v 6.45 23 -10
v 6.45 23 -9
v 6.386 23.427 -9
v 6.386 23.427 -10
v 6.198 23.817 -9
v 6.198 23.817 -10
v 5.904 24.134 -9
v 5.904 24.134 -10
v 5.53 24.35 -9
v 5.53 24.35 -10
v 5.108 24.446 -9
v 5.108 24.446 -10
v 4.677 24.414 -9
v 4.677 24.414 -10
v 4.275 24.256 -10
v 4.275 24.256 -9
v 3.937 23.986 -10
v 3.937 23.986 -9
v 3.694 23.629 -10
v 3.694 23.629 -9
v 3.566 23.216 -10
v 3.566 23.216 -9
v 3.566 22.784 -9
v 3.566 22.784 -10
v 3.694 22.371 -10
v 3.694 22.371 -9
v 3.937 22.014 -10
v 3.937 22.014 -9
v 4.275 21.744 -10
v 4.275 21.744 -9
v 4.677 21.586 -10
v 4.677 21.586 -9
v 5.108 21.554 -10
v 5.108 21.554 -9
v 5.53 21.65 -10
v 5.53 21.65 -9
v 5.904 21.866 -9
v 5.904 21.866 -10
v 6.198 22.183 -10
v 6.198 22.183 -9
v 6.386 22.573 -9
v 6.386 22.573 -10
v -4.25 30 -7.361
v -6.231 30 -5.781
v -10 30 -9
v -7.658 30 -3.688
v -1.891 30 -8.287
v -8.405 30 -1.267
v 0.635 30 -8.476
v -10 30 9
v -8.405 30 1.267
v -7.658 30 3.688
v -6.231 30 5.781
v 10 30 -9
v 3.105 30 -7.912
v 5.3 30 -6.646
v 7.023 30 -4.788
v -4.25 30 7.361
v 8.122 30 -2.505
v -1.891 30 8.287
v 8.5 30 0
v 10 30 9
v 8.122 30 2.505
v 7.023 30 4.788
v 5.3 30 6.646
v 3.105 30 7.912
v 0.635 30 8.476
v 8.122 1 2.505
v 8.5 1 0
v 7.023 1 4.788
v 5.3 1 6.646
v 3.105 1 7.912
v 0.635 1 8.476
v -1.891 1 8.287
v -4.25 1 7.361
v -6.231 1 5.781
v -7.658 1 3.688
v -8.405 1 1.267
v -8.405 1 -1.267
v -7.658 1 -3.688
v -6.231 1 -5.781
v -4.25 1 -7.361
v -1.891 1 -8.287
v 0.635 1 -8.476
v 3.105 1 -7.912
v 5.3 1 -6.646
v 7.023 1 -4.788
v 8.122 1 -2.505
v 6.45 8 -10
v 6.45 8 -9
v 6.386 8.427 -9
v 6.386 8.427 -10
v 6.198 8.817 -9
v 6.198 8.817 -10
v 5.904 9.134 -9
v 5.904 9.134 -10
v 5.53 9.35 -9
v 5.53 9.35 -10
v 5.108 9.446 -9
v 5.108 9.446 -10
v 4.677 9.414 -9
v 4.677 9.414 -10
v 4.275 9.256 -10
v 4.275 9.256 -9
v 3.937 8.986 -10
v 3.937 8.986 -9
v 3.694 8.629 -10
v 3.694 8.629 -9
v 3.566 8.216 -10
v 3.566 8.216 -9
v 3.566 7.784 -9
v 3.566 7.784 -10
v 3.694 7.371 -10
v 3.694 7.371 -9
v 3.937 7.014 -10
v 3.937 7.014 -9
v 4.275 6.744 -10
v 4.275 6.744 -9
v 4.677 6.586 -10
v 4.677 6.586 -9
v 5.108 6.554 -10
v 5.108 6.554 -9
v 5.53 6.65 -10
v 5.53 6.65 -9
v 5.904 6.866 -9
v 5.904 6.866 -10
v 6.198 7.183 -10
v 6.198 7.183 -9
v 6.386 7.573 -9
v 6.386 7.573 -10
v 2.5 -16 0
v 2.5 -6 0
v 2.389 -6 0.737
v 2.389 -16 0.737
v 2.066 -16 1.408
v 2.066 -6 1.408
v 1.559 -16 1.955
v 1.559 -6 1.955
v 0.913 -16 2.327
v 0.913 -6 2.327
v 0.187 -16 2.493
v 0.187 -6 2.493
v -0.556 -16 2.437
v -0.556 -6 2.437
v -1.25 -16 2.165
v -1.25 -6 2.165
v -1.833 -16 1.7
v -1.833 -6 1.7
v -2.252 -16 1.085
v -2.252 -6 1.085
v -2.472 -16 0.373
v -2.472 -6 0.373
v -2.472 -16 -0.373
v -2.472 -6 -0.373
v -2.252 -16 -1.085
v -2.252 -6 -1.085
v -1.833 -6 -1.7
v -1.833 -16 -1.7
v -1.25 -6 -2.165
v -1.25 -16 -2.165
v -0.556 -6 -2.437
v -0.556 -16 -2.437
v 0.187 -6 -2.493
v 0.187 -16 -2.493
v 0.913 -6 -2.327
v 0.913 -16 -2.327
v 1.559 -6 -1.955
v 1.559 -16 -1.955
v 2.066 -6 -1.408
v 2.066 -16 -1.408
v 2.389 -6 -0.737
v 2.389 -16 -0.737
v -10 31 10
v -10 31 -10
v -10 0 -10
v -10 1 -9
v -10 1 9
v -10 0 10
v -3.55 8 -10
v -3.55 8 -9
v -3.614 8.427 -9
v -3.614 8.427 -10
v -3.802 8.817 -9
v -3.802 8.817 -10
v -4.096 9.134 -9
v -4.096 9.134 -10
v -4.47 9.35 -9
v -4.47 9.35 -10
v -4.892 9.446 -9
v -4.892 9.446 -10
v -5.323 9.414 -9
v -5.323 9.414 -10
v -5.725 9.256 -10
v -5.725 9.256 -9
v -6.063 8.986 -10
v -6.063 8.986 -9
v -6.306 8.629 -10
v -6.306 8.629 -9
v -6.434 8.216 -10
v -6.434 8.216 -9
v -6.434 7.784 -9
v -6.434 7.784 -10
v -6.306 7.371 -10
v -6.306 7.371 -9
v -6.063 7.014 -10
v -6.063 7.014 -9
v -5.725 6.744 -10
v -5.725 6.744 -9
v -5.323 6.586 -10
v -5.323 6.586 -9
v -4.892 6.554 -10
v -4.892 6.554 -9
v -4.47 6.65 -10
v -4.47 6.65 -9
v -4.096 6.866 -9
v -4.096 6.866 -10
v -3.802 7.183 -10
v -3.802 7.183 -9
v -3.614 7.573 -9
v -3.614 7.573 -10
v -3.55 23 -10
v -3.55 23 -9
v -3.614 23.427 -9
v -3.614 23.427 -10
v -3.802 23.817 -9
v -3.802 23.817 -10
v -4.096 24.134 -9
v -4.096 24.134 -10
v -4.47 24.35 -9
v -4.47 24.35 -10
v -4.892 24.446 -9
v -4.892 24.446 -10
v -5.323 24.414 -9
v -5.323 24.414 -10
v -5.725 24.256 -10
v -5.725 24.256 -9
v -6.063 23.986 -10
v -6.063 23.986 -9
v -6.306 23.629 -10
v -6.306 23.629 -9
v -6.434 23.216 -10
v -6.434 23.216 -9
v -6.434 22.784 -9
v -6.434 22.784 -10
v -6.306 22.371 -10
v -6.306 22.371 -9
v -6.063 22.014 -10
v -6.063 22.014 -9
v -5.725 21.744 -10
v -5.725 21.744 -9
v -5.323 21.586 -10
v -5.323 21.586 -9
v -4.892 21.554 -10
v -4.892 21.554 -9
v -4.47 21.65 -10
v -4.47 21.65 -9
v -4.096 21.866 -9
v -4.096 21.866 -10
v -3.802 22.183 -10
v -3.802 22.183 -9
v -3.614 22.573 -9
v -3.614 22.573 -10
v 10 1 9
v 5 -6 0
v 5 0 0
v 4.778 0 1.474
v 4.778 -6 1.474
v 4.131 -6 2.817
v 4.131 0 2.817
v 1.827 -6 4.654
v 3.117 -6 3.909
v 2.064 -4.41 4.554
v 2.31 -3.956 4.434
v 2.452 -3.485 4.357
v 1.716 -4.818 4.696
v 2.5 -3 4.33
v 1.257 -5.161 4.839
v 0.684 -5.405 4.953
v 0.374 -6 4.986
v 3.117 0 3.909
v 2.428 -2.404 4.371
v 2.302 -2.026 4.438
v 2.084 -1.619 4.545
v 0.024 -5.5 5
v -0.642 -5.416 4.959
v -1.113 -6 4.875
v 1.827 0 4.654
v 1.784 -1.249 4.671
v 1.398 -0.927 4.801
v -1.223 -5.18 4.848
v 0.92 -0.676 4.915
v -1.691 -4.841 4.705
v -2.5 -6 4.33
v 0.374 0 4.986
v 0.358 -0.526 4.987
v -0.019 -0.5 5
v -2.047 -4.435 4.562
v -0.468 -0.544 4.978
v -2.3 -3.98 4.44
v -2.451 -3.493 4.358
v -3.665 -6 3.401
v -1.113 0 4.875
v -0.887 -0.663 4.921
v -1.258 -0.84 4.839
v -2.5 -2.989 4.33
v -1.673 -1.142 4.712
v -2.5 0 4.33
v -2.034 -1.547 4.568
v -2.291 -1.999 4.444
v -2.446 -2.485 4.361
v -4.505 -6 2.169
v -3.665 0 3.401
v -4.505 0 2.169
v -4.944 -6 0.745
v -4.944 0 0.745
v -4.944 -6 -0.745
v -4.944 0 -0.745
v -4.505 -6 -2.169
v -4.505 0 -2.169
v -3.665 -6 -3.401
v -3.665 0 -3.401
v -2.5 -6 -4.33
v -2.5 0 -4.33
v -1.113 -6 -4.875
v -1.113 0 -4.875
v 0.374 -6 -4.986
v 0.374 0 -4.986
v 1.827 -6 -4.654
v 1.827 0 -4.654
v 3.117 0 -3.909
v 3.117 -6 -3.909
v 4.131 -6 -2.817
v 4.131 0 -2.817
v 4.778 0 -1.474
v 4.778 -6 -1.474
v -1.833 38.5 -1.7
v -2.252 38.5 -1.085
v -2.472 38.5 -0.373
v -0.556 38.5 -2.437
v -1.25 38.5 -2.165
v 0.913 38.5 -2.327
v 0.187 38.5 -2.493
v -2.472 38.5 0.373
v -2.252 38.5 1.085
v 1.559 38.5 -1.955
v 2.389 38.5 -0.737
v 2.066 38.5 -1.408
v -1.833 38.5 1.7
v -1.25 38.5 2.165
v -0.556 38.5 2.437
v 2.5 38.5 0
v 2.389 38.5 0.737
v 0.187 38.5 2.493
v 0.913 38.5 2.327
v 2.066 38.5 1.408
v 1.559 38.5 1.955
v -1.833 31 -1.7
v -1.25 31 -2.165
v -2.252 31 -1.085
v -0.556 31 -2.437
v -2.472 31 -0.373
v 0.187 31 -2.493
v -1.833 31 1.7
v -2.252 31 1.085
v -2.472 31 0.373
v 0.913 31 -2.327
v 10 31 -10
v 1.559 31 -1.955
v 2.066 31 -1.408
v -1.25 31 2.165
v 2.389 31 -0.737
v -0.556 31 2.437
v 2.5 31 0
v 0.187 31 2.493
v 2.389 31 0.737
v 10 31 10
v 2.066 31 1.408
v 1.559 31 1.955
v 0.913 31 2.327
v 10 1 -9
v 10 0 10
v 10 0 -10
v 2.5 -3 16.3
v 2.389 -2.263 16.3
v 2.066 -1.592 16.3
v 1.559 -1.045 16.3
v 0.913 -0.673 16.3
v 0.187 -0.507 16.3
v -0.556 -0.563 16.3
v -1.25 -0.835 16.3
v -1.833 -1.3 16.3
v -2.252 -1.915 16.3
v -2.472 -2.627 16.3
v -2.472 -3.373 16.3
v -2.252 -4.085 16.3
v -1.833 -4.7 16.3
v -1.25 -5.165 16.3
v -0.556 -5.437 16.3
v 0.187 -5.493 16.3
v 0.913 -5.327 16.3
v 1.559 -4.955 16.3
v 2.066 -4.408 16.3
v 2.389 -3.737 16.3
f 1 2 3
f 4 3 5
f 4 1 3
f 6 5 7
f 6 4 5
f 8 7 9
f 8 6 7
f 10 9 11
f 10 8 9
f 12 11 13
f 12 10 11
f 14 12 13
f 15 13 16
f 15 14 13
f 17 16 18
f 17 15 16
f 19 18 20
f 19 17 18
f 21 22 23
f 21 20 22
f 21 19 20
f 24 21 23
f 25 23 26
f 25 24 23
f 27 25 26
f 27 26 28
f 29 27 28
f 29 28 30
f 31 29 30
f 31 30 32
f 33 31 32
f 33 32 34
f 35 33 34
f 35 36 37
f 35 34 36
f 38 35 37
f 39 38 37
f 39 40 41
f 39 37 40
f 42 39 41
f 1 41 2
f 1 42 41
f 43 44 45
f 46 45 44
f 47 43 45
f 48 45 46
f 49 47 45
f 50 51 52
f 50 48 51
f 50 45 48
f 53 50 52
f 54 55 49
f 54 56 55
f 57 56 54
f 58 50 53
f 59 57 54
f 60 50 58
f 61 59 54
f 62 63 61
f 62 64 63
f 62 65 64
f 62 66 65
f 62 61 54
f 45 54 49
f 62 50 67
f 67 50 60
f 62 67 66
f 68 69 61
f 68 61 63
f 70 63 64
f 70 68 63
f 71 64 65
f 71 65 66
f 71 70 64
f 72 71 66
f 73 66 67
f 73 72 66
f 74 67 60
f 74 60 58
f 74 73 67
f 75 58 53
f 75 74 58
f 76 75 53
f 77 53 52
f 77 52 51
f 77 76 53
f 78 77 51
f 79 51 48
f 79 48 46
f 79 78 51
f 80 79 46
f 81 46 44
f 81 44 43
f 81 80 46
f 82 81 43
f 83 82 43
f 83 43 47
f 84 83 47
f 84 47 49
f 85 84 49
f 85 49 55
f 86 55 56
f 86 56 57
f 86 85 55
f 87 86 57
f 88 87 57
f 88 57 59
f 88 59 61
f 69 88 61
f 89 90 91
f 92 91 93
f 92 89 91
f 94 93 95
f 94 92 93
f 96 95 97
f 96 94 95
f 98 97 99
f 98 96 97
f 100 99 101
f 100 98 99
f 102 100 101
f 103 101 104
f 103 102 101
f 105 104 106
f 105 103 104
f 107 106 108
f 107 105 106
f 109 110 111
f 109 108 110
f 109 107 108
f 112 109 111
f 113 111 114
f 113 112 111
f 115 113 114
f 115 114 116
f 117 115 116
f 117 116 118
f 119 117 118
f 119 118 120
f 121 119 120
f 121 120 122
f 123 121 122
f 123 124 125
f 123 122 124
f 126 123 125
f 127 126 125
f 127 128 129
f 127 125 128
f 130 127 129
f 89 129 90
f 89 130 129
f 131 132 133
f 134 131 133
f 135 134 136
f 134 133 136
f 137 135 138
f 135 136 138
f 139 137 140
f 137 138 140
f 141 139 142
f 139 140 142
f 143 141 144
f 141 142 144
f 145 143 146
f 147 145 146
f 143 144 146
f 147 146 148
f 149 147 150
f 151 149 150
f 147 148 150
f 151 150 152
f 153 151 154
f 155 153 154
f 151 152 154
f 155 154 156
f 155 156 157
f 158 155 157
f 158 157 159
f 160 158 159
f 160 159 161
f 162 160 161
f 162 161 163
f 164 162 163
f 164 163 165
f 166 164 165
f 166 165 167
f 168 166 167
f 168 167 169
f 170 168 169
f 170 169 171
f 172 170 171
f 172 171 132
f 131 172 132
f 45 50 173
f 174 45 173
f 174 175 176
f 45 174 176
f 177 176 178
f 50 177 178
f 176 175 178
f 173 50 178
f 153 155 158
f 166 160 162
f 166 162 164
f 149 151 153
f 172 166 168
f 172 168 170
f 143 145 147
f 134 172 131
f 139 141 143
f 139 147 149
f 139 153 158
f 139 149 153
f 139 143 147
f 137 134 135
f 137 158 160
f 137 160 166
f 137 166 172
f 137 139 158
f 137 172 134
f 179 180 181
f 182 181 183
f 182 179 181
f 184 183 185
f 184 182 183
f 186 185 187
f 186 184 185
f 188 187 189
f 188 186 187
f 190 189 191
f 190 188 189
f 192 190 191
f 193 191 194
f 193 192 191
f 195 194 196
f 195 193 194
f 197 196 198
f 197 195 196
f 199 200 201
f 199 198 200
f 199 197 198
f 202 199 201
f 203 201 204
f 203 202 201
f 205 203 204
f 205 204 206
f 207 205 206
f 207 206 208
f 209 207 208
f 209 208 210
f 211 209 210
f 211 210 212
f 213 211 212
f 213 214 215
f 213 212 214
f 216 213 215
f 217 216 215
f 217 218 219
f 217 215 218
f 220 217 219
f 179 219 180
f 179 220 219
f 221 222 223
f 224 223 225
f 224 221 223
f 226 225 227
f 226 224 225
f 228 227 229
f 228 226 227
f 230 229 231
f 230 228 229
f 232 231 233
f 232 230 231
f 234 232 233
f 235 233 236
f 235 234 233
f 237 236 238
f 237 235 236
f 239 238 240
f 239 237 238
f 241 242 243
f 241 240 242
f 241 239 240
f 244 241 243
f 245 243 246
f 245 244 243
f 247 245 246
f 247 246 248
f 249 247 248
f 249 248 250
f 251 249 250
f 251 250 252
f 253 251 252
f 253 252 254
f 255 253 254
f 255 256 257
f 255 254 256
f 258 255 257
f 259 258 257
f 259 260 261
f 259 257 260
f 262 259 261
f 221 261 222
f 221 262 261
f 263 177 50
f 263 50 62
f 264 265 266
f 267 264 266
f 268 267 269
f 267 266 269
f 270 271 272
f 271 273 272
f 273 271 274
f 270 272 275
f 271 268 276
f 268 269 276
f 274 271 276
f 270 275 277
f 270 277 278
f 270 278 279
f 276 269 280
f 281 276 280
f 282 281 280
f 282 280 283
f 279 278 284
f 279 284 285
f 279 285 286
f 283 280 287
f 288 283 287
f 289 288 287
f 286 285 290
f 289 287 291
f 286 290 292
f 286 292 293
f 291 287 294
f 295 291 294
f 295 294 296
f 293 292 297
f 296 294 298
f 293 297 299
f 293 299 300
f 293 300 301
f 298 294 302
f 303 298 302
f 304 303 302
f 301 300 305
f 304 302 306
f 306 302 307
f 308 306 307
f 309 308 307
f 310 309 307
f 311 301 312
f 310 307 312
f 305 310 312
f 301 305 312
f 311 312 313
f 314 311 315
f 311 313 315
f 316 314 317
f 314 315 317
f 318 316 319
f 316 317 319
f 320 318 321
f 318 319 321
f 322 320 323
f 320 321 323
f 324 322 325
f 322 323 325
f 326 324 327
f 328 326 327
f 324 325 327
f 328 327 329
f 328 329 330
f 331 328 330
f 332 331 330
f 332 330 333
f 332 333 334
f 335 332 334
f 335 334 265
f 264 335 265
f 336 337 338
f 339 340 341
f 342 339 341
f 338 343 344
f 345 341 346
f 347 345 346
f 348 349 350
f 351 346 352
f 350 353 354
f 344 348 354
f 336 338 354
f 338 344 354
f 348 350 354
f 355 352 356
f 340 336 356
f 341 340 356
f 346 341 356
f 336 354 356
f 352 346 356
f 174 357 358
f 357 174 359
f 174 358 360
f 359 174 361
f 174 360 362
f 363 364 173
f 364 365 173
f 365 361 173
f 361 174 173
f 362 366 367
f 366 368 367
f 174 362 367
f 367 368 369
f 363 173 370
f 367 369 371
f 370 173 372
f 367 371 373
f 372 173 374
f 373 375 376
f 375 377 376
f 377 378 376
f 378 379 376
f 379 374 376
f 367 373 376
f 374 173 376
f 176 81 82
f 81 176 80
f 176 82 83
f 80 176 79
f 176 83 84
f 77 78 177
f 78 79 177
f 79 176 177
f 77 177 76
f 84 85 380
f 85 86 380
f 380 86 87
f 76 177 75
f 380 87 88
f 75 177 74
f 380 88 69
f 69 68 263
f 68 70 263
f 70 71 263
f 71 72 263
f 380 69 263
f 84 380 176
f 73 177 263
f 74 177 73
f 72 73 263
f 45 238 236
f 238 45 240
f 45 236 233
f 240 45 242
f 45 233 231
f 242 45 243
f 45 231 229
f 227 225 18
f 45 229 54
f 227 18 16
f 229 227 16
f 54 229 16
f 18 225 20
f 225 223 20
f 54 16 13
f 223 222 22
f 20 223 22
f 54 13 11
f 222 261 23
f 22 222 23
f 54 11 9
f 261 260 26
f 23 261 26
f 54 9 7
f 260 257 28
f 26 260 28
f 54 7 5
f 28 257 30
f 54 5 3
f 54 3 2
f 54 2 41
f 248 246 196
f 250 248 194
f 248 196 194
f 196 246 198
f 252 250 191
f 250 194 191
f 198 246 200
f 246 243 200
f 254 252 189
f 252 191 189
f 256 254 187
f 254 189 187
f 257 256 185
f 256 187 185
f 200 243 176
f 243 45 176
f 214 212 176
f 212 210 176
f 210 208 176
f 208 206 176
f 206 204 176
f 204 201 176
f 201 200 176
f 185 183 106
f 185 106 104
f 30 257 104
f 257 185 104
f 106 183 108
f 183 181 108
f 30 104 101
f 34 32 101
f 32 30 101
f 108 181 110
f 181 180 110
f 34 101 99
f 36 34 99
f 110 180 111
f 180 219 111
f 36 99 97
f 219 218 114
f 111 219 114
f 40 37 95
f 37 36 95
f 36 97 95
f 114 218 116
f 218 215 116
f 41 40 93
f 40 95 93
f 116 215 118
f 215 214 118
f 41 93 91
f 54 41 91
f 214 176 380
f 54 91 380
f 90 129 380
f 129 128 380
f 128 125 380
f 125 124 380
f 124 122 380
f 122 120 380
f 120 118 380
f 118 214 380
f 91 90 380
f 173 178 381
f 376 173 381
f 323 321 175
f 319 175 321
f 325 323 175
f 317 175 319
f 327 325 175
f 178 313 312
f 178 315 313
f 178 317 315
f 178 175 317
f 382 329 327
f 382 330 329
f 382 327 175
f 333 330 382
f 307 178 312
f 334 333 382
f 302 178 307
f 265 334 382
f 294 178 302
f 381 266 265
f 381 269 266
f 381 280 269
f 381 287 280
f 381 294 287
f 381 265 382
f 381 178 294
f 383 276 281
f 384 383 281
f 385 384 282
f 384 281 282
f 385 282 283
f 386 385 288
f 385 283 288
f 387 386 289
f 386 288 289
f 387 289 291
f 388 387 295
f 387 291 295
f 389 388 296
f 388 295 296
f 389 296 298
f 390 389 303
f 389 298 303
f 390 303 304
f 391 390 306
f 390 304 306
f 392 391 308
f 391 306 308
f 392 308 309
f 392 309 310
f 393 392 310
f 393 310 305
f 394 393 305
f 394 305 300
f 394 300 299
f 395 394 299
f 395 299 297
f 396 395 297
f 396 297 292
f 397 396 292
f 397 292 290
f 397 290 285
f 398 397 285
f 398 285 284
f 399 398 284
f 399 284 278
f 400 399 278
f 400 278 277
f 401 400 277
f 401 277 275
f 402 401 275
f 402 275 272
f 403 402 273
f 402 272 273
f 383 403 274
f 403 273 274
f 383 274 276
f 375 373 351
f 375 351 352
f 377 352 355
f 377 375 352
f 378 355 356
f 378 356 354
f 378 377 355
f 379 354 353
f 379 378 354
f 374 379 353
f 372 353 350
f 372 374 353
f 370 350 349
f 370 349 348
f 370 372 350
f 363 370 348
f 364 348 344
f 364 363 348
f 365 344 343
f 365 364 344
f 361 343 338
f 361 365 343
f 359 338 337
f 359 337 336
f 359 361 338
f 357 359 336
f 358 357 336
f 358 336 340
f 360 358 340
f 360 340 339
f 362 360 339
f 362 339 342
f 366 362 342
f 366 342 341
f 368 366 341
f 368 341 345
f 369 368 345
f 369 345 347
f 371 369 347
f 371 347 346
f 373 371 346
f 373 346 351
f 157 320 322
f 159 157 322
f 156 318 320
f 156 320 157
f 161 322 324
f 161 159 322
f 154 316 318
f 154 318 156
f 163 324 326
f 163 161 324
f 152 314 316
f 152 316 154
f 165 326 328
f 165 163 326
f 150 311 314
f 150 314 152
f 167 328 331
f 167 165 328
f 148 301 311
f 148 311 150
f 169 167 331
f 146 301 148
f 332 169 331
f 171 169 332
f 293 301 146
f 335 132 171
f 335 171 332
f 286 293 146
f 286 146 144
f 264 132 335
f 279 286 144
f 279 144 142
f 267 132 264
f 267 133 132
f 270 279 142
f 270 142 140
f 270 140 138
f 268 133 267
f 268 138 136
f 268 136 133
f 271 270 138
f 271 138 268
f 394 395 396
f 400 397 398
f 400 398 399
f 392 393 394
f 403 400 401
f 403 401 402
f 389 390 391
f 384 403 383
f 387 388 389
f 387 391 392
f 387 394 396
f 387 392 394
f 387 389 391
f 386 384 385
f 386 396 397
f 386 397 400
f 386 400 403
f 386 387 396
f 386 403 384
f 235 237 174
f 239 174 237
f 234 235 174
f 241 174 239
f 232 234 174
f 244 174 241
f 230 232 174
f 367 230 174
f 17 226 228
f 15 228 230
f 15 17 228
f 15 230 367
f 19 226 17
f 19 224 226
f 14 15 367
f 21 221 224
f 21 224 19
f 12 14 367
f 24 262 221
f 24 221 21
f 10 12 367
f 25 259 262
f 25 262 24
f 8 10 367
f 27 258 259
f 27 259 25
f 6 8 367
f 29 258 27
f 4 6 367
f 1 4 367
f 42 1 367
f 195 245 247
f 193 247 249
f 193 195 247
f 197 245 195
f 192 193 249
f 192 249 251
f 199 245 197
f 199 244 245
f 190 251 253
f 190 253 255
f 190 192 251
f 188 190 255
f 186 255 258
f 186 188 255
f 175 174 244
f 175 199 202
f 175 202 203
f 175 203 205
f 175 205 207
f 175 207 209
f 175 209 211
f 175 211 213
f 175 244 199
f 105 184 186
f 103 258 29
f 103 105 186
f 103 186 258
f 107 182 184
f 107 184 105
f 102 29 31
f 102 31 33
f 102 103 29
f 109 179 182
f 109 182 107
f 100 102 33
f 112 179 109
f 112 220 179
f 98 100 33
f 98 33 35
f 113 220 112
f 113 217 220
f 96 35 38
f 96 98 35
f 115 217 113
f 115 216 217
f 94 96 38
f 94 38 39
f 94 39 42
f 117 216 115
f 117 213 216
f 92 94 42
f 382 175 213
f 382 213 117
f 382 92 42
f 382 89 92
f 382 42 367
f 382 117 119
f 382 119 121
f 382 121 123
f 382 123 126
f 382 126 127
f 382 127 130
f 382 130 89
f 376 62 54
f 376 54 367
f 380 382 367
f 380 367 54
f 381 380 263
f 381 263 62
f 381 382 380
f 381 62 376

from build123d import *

# Parameters (mm, degrees)
SKETCH_W          = 20
SKETCH_H          = 20
PAD_DEPTH         = 31
SKETCH001_R       = 2.5
PAD001_DEPTH      = 16
PAD001_DEPTH_BACK = 38.5
SKETCH002_R       = 2.5
PAD002_DEPTH      = 16.3
SKETCH003_W       = 20
SKETCH003_H       = 18
SKETCH003_R       = 8.5
POCKET_DEPTH      = 29
SKETCH004_R       = 1.45
HOLE_DEPTH        = 2
HOLE_TIPS_R       = 1.45
SKETCH005_R       = 5
PAD003_DEPTH      = 6


with BuildPart() as part:
    # Sketch → Pad (new body)
    with BuildSketch(Plane.XZ):
        Rectangle(SKETCH_W, SKETCH_H)
    extrude(amount=-PAD_DEPTH)

    # Sketch001 → Pad001 (join, two sides)
    with BuildSketch(Plane.XZ) as pad001_sk:
        Circle(SKETCH001_R)
    extrude(amount=PAD001_DEPTH)
    extrude(pad001_sk.sketch, amount=-PAD001_DEPTH_BACK)

    # Sketch002 → Pad002 (join)
    with BuildSketch(Plane.XY):
        with Locations((0, -3)):
            Circle(SKETCH002_R)
    extrude(amount=PAD002_DEPTH)

    # Sketch003 → Pocket (cut)
    with BuildSketch(Plane.XZ.offset(-1)):
        Rectangle(SKETCH003_W, SKETCH003_H)
        Circle(SKETCH003_R, mode=Mode.SUBTRACT)
    extrude(amount=-POCKET_DEPTH, mode=Mode.SUBTRACT)

    # Sketch004 → Hole (cut)
    with BuildSketch(Plane.XY.offset(-10)):
        with Locations((-5, 23)):
            Circle(SKETCH004_R)
        with Locations((-5, 8)):
            Circle(SKETCH004_R)
        with Locations((5, 8)):
            Circle(SKETCH004_R)
        with Locations((5, 23)):
            Circle(SKETCH004_R)
    extrude(amount=HOLE_DEPTH, mode=Mode.SUBTRACT)

    # Hole tips → Hole tip 1 section 0
    with BuildSketch(Plane.XY.offset(-8), mode=Mode.PRIVATE) as hole_tip_1_s0:
        with Locations((-5, 23)):
            Circle(HOLE_TIPS_R)
    loft([hole_tip_1_s0.sketch, Vertex(-5, 23, -7.128752)], mode=Mode.SUBTRACT)

    # Hole tips → Hole tip 2 section 0
    with BuildSketch(Plane.XY.offset(-8), mode=Mode.PRIVATE) as hole_tip_2_s0:
        with Locations((-5, 8)):
            Circle(HOLE_TIPS_R)
    loft([hole_tip_2_s0.sketch, Vertex(-5, 8, -7.128752)], mode=Mode.SUBTRACT)

    # Hole tips → Hole tip 3 section 0
    with BuildSketch(Plane.XY.offset(-8), mode=Mode.PRIVATE) as hole_tip_3_s0:
        with Locations((5, 8)):
            Circle(HOLE_TIPS_R)
    loft([hole_tip_3_s0.sketch, Vertex(5, 8, -7.128752)], mode=Mode.SUBTRACT)

    # Hole tips → Hole tip 4 section 0
    with BuildSketch(Plane.XY.offset(-8), mode=Mode.PRIVATE) as hole_tip_4_s0:
        with Locations((5, 23)):
            Circle(HOLE_TIPS_R)
    loft([hole_tip_4_s0.sketch, Vertex(5, 23, -7.128752)], mode=Mode.SUBTRACT)

    # Sketch005 → Pad003 (join)
    with BuildSketch(Plane.XZ):
        Circle(SKETCH005_R)
    extrude(amount=PAD003_DEPTH)


solid = part.part
